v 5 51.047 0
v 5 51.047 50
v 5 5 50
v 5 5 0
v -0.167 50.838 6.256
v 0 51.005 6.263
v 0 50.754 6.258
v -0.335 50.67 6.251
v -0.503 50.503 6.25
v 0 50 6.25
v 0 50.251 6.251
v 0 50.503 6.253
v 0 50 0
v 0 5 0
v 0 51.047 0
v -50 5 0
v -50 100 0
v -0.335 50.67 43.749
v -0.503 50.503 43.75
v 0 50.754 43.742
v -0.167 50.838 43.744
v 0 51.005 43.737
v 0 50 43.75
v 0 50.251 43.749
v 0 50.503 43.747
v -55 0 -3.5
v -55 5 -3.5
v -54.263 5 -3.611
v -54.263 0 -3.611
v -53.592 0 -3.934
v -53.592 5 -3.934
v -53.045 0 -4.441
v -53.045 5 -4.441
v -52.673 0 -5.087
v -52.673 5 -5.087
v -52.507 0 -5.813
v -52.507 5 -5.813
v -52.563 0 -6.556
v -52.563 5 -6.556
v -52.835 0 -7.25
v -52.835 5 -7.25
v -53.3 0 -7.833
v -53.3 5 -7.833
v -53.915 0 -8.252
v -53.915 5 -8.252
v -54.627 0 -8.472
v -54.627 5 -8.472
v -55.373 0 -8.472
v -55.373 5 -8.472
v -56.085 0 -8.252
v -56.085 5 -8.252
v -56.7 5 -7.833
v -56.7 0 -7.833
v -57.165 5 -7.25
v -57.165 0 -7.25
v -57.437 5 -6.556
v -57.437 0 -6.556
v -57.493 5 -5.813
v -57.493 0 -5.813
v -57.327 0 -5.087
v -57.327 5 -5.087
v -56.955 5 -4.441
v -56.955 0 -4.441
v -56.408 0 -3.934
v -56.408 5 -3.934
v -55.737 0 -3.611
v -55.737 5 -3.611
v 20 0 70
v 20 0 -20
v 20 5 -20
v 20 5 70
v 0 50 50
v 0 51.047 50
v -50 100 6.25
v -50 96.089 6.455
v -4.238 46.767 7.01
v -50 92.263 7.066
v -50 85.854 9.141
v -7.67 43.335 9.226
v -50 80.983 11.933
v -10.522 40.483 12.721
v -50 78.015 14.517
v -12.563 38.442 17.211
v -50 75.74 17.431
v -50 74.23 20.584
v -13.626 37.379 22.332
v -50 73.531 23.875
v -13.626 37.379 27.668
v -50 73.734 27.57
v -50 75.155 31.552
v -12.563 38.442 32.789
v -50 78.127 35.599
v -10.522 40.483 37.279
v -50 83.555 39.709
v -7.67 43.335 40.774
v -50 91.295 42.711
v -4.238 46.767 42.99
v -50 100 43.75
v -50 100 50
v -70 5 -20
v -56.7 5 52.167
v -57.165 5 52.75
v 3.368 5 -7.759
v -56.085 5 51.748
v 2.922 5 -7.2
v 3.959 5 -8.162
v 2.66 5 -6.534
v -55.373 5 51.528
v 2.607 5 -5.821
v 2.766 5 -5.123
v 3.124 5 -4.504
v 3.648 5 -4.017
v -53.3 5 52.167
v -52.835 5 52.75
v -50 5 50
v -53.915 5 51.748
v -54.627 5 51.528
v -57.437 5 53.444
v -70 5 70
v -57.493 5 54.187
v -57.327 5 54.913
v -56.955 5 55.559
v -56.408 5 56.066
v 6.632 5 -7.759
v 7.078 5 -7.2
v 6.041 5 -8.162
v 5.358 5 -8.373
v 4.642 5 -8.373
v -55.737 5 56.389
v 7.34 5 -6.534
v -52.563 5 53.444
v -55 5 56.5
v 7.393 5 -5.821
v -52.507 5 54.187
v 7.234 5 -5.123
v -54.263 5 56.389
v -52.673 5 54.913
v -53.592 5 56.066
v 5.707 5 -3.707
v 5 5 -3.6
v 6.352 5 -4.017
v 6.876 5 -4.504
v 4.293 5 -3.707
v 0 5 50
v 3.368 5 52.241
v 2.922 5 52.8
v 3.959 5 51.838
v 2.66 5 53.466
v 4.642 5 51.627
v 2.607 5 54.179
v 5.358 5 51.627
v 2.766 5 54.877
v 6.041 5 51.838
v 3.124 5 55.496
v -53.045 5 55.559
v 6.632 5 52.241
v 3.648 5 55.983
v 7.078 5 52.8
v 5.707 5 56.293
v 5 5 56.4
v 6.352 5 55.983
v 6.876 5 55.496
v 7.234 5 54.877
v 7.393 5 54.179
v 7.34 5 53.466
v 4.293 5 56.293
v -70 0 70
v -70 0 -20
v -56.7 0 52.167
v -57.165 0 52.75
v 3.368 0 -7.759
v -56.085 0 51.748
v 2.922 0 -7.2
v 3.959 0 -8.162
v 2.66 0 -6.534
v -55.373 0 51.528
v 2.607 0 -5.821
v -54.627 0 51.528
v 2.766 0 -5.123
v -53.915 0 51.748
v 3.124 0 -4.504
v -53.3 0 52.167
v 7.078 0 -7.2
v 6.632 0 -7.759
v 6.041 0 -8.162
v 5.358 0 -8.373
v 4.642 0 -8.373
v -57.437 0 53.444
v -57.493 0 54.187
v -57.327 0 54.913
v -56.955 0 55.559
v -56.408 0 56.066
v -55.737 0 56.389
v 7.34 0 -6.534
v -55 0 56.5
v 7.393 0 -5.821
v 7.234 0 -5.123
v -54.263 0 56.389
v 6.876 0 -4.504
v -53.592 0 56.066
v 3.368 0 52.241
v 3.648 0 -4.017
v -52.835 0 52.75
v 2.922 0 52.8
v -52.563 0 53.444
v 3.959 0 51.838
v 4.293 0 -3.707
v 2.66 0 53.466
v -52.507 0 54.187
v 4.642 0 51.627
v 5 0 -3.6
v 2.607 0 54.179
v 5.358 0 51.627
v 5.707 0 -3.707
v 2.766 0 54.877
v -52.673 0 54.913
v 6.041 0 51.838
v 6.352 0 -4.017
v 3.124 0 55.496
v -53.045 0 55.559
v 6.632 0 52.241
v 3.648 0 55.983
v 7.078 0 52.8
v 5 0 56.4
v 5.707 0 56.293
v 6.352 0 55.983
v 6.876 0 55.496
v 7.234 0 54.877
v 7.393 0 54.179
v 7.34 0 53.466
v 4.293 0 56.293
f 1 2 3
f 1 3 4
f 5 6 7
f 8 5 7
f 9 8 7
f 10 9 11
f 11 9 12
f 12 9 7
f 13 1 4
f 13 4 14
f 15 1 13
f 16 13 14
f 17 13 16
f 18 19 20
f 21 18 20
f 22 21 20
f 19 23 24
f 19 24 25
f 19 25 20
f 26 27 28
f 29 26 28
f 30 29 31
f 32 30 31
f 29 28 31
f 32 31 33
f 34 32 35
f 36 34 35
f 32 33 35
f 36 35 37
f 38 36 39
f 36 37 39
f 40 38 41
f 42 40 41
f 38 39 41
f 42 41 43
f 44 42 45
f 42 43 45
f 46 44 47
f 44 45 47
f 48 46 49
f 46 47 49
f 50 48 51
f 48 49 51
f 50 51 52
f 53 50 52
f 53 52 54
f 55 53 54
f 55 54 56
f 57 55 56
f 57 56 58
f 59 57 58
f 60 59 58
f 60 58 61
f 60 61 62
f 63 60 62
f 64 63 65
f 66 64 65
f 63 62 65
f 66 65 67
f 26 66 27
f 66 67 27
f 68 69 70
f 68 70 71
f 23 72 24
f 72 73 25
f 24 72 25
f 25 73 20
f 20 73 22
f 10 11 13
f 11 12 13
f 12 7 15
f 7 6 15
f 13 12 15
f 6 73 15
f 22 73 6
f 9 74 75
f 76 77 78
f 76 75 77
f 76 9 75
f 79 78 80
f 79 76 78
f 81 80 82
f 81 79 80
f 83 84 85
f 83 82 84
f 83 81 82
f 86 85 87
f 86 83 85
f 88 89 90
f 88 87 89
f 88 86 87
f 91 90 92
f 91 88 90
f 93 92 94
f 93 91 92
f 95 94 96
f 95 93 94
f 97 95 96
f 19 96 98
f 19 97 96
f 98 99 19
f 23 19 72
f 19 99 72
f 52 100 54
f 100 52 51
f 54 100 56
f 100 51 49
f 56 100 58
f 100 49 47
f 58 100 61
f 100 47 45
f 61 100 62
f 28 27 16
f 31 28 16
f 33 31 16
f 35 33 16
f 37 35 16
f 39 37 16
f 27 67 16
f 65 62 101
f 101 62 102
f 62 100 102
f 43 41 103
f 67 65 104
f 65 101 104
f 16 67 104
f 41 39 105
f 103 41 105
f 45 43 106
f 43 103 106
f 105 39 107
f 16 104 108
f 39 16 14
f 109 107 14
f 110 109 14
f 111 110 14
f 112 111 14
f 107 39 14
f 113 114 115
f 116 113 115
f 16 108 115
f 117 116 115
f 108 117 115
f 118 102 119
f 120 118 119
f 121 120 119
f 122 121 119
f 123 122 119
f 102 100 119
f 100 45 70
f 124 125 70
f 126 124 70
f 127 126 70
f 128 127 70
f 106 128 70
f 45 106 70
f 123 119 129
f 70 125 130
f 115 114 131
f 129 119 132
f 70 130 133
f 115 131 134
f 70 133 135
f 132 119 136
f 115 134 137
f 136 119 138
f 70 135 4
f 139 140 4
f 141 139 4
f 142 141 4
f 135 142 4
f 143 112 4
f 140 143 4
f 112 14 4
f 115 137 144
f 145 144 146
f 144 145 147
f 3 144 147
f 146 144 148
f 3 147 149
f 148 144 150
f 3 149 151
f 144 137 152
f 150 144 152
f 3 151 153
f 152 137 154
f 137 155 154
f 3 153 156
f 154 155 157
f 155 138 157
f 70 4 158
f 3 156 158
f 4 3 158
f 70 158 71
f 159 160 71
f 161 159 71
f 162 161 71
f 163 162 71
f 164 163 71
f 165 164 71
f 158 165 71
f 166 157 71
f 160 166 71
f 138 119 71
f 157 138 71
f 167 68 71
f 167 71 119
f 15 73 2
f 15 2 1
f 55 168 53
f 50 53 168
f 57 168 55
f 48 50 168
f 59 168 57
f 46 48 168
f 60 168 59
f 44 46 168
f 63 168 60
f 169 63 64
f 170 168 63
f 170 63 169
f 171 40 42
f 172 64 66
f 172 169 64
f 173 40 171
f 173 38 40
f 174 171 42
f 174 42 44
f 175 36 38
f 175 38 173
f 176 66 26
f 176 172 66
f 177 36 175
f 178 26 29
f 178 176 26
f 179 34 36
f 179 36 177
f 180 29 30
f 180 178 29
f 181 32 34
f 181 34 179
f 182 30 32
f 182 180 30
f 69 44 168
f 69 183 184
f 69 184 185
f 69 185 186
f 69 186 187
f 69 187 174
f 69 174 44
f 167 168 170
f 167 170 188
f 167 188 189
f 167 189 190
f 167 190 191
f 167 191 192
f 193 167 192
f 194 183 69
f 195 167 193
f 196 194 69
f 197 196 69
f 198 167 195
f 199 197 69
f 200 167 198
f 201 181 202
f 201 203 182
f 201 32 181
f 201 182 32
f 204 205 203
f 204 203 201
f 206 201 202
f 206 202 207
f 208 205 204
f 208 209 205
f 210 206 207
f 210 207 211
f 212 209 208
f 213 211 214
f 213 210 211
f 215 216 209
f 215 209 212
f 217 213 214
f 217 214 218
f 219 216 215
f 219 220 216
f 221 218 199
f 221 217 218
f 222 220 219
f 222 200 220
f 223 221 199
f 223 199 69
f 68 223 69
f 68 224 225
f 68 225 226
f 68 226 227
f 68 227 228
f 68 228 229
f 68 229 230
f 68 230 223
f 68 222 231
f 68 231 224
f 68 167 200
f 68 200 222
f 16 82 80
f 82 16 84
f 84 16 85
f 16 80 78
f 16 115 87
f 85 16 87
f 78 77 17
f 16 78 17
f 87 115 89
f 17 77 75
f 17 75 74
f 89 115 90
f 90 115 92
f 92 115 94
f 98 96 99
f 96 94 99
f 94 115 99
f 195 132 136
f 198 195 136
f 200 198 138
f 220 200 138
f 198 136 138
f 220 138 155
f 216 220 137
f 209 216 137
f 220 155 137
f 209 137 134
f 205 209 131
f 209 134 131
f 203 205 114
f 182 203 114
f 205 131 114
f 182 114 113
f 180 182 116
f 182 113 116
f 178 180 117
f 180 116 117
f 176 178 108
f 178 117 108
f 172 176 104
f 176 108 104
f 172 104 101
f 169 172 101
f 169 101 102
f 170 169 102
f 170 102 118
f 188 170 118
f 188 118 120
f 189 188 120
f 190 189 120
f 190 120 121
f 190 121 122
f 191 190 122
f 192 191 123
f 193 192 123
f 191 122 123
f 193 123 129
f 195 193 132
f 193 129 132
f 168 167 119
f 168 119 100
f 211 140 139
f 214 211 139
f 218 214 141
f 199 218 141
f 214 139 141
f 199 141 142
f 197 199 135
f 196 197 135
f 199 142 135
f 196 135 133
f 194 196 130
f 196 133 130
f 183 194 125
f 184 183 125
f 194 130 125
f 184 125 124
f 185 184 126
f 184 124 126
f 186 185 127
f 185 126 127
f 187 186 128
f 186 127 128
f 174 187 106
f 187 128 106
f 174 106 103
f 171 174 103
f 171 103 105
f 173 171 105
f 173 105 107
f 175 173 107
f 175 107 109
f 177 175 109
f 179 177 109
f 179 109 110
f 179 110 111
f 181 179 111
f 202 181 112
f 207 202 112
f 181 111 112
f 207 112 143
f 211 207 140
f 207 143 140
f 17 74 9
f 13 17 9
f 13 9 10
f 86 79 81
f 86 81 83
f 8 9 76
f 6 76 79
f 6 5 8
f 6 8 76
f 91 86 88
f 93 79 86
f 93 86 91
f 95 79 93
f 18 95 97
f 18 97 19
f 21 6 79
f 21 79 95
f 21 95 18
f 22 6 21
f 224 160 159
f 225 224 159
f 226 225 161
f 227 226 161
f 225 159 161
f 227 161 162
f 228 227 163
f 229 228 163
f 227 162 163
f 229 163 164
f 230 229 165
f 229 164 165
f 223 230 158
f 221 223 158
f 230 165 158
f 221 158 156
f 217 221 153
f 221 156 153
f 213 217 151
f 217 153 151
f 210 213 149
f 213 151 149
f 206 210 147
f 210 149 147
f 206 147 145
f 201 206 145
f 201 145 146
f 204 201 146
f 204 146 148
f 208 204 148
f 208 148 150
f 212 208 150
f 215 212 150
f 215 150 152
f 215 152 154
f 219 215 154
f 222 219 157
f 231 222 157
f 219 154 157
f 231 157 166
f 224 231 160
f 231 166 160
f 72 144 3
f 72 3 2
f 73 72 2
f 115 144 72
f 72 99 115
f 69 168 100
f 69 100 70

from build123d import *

# Parameters (mm, degrees)
SKETCH1_W               = 50
SKETCH1_H               = 50
BOSS_EXTRUDE1_DEPTH     = 50
BOSS_EXTRUDE2_DEPTH     = 50
SKETCH4_W               = 18.75
SKETCH4_H               = 70.710678119
CUT_EXTRUDE2_DEPTH      = 100
CUT_EXTRUDE2_DEPTH_BACK = 100
SKETCH5_R               = 18.75
SKETCH6_W               = 50
SKETCH6_H               = 50
BOSS_EXTRUDE3_DEPTH     = 5
SKETCH7_W               = 18.75
SKETCH7_H               = 70.710678119
SKETCH9_R               = 18.867934004
BOSS_EXTRUDE6_DEPTH     = 20
SKETCH10_W              = 50
SKETCH10_H              = 65.146880585
CUT_EXTRUDE3_DEPTH      = 40
CUT_EXTRUDE4_START      = -70
SKETCH11_R              = 18.75
CUT_EXTRUDE4_DEPTH      = 70
SKETCH12_W              = 50
SKETCH12_H              = 46.047099175
BOSS_EXTRUDE7_DEPTH     = 5
SKETCH13_R              = 2.4
SKETCH13_R_2            = 2.5
CUT_EXTRUDE5_DEPTH      = 5


with BuildPart() as part:
    # Sketch1 → Boss-Extrude1 (new body)
    with BuildSketch(Plane.XY):
        with Locations((-25, 25)):
            Rectangle(SKETCH1_W, SKETCH1_H)
    extrude(amount=BOSS_EXTRUDE1_DEPTH)

    # Sketch2 → Boss-Extrude2 (add)
    with BuildSketch(Plane.XY.offset(50)):
        Polygon((0, 50), (-50, 50), (-50, 100), align=None)
    extrude(amount=-BOSS_EXTRUDE2_DEPTH)

    # Sketch4 → Revolve1 (revolve)
    with BuildSketch(Plane(origin=(25, 25, 0), x_dir=(0, 0, -1), z_dir=(0.7071067811865477, 0.7071067811865475, 0))):
        with Locations((-34.375, 70.710678118)):
            Rectangle(SKETCH4_W, SKETCH4_H)
    revolve(axis=Axis((-50, 100, 25), (0.7071067811865475, -0.7071067811865477, 0)))

    # Sketch5 → Cut-Extrude2 (cut, two sides: drawn at the far end of the back side and taken through both)
    with BuildSketch(Plane(origin=(-25, 25, 0), x_dir=(0, 0, -1), z_dir=(0.7071067811865477, -0.7071067811865475, 0)).offset(-CUT_EXTRUDE2_DEPTH_BACK)):
        with Locations((-25, 35.355339059)):
            Circle(SKETCH5_R)
    extrude(amount=CUT_EXTRUDE2_DEPTH + CUT_EXTRUDE2_DEPTH_BACK, mode=Mode.SUBTRACT)

    # Sketch6 → Boss-Extrude3 (add)
    with BuildSketch(Plane.XZ):
        Polygon((-70, -20), (-50, -20), (20, -20), (20, 50), (20, 70), (0, 70), (-70, 70), (-70, 0), align=None)
        with Locations((-25, 25)):
            Rectangle(SKETCH6_W, SKETCH6_H, mode=Mode.SUBTRACT)
    extrude(amount=-BOSS_EXTRUDE3_DEPTH)

    # Sketch7 → Revolve2 (revolve)
    with BuildSketch(Plane(origin=(25, 25, 0), x_dir=(0, 0, -1), z_dir=(0.7071067811865477, 0.7071067811865475, 0))):
        with Locations((-34.375, 70.710678118)):
            Rectangle(SKETCH7_W, SKETCH7_H)
    revolve(axis=Axis((0, 50, 25), (-0.7071067811865475, 0.7071067811865477, 0)))

    # Sketch9 → Boss-Extrude6 (add)
    with BuildSketch(Plane(origin=(-25, 25, 0), x_dir=(0, 0, -1), z_dir=(0.7071067811865477, -0.7071067811865475, 0))):
        with Locations((-25.10968595, 35.312009835)):
            Circle(SKETCH9_R)
    extrude(amount=BOSS_EXTRUDE6_DEPTH)

    # Sketch10 → Cut-Extrude3 (cut)
    with BuildSketch(Plane(origin=(0, 0, 0), x_dir=(0, 0, -1), z_dir=(1, 0, 0))):
        with Locations((-25, 49.118259987)):
            Rectangle(SKETCH10_W, SKETCH10_H)
    extrude(amount=CUT_EXTRUDE3_DEPTH, mode=Mode.SUBTRACT)

    # Sketch11 → Cut-Extrude4 (cut)
    with BuildSketch(Plane(origin=(-75, 75, 0), x_dir=(0, 0, 1), z_dir=(-0.7071067811865477, 0.7071067811865475, 0)).offset(CUT_EXTRUDE4_START)):
        with Locations((25, 35.355339059)):
            Circle(SKETCH11_R)
    extrude(amount=CUT_EXTRUDE4_DEPTH, mode=Mode.SUBTRACT)

    # Sketch12 → Boss-Extrude7 (add)
    with BuildSketch(Plane(origin=(0, 0, 0), x_dir=(0, 0, -1), z_dir=(1, 0, 0))):
        with Locations((-25, 28.023549588)):
            Rectangle(SKETCH12_W, SKETCH12_H)
    extrude(amount=BOSS_EXTRUDE7_DEPTH)

    # Sketch13 → Cut-Extrude5 (cut)
    with BuildSketch(Plane(origin=(0, 5, 0), x_dir=(1, 0, 0), z_dir=(0, 1, 0))):
        with Locations((5, 6)):
            Circle(SKETCH13_R)
        with Locations((5, -54)):
            Circle(SKETCH13_R)
        with Locations((-55, 6)):
            Circle(SKETCH13_R_2)
        with Locations((-55, -54)):
            Circle(SKETCH13_R_2)
    extrude(amount=-CUT_EXTRUDE5_DEPTH, mode=Mode.SUBTRACT)


solid = part.part
